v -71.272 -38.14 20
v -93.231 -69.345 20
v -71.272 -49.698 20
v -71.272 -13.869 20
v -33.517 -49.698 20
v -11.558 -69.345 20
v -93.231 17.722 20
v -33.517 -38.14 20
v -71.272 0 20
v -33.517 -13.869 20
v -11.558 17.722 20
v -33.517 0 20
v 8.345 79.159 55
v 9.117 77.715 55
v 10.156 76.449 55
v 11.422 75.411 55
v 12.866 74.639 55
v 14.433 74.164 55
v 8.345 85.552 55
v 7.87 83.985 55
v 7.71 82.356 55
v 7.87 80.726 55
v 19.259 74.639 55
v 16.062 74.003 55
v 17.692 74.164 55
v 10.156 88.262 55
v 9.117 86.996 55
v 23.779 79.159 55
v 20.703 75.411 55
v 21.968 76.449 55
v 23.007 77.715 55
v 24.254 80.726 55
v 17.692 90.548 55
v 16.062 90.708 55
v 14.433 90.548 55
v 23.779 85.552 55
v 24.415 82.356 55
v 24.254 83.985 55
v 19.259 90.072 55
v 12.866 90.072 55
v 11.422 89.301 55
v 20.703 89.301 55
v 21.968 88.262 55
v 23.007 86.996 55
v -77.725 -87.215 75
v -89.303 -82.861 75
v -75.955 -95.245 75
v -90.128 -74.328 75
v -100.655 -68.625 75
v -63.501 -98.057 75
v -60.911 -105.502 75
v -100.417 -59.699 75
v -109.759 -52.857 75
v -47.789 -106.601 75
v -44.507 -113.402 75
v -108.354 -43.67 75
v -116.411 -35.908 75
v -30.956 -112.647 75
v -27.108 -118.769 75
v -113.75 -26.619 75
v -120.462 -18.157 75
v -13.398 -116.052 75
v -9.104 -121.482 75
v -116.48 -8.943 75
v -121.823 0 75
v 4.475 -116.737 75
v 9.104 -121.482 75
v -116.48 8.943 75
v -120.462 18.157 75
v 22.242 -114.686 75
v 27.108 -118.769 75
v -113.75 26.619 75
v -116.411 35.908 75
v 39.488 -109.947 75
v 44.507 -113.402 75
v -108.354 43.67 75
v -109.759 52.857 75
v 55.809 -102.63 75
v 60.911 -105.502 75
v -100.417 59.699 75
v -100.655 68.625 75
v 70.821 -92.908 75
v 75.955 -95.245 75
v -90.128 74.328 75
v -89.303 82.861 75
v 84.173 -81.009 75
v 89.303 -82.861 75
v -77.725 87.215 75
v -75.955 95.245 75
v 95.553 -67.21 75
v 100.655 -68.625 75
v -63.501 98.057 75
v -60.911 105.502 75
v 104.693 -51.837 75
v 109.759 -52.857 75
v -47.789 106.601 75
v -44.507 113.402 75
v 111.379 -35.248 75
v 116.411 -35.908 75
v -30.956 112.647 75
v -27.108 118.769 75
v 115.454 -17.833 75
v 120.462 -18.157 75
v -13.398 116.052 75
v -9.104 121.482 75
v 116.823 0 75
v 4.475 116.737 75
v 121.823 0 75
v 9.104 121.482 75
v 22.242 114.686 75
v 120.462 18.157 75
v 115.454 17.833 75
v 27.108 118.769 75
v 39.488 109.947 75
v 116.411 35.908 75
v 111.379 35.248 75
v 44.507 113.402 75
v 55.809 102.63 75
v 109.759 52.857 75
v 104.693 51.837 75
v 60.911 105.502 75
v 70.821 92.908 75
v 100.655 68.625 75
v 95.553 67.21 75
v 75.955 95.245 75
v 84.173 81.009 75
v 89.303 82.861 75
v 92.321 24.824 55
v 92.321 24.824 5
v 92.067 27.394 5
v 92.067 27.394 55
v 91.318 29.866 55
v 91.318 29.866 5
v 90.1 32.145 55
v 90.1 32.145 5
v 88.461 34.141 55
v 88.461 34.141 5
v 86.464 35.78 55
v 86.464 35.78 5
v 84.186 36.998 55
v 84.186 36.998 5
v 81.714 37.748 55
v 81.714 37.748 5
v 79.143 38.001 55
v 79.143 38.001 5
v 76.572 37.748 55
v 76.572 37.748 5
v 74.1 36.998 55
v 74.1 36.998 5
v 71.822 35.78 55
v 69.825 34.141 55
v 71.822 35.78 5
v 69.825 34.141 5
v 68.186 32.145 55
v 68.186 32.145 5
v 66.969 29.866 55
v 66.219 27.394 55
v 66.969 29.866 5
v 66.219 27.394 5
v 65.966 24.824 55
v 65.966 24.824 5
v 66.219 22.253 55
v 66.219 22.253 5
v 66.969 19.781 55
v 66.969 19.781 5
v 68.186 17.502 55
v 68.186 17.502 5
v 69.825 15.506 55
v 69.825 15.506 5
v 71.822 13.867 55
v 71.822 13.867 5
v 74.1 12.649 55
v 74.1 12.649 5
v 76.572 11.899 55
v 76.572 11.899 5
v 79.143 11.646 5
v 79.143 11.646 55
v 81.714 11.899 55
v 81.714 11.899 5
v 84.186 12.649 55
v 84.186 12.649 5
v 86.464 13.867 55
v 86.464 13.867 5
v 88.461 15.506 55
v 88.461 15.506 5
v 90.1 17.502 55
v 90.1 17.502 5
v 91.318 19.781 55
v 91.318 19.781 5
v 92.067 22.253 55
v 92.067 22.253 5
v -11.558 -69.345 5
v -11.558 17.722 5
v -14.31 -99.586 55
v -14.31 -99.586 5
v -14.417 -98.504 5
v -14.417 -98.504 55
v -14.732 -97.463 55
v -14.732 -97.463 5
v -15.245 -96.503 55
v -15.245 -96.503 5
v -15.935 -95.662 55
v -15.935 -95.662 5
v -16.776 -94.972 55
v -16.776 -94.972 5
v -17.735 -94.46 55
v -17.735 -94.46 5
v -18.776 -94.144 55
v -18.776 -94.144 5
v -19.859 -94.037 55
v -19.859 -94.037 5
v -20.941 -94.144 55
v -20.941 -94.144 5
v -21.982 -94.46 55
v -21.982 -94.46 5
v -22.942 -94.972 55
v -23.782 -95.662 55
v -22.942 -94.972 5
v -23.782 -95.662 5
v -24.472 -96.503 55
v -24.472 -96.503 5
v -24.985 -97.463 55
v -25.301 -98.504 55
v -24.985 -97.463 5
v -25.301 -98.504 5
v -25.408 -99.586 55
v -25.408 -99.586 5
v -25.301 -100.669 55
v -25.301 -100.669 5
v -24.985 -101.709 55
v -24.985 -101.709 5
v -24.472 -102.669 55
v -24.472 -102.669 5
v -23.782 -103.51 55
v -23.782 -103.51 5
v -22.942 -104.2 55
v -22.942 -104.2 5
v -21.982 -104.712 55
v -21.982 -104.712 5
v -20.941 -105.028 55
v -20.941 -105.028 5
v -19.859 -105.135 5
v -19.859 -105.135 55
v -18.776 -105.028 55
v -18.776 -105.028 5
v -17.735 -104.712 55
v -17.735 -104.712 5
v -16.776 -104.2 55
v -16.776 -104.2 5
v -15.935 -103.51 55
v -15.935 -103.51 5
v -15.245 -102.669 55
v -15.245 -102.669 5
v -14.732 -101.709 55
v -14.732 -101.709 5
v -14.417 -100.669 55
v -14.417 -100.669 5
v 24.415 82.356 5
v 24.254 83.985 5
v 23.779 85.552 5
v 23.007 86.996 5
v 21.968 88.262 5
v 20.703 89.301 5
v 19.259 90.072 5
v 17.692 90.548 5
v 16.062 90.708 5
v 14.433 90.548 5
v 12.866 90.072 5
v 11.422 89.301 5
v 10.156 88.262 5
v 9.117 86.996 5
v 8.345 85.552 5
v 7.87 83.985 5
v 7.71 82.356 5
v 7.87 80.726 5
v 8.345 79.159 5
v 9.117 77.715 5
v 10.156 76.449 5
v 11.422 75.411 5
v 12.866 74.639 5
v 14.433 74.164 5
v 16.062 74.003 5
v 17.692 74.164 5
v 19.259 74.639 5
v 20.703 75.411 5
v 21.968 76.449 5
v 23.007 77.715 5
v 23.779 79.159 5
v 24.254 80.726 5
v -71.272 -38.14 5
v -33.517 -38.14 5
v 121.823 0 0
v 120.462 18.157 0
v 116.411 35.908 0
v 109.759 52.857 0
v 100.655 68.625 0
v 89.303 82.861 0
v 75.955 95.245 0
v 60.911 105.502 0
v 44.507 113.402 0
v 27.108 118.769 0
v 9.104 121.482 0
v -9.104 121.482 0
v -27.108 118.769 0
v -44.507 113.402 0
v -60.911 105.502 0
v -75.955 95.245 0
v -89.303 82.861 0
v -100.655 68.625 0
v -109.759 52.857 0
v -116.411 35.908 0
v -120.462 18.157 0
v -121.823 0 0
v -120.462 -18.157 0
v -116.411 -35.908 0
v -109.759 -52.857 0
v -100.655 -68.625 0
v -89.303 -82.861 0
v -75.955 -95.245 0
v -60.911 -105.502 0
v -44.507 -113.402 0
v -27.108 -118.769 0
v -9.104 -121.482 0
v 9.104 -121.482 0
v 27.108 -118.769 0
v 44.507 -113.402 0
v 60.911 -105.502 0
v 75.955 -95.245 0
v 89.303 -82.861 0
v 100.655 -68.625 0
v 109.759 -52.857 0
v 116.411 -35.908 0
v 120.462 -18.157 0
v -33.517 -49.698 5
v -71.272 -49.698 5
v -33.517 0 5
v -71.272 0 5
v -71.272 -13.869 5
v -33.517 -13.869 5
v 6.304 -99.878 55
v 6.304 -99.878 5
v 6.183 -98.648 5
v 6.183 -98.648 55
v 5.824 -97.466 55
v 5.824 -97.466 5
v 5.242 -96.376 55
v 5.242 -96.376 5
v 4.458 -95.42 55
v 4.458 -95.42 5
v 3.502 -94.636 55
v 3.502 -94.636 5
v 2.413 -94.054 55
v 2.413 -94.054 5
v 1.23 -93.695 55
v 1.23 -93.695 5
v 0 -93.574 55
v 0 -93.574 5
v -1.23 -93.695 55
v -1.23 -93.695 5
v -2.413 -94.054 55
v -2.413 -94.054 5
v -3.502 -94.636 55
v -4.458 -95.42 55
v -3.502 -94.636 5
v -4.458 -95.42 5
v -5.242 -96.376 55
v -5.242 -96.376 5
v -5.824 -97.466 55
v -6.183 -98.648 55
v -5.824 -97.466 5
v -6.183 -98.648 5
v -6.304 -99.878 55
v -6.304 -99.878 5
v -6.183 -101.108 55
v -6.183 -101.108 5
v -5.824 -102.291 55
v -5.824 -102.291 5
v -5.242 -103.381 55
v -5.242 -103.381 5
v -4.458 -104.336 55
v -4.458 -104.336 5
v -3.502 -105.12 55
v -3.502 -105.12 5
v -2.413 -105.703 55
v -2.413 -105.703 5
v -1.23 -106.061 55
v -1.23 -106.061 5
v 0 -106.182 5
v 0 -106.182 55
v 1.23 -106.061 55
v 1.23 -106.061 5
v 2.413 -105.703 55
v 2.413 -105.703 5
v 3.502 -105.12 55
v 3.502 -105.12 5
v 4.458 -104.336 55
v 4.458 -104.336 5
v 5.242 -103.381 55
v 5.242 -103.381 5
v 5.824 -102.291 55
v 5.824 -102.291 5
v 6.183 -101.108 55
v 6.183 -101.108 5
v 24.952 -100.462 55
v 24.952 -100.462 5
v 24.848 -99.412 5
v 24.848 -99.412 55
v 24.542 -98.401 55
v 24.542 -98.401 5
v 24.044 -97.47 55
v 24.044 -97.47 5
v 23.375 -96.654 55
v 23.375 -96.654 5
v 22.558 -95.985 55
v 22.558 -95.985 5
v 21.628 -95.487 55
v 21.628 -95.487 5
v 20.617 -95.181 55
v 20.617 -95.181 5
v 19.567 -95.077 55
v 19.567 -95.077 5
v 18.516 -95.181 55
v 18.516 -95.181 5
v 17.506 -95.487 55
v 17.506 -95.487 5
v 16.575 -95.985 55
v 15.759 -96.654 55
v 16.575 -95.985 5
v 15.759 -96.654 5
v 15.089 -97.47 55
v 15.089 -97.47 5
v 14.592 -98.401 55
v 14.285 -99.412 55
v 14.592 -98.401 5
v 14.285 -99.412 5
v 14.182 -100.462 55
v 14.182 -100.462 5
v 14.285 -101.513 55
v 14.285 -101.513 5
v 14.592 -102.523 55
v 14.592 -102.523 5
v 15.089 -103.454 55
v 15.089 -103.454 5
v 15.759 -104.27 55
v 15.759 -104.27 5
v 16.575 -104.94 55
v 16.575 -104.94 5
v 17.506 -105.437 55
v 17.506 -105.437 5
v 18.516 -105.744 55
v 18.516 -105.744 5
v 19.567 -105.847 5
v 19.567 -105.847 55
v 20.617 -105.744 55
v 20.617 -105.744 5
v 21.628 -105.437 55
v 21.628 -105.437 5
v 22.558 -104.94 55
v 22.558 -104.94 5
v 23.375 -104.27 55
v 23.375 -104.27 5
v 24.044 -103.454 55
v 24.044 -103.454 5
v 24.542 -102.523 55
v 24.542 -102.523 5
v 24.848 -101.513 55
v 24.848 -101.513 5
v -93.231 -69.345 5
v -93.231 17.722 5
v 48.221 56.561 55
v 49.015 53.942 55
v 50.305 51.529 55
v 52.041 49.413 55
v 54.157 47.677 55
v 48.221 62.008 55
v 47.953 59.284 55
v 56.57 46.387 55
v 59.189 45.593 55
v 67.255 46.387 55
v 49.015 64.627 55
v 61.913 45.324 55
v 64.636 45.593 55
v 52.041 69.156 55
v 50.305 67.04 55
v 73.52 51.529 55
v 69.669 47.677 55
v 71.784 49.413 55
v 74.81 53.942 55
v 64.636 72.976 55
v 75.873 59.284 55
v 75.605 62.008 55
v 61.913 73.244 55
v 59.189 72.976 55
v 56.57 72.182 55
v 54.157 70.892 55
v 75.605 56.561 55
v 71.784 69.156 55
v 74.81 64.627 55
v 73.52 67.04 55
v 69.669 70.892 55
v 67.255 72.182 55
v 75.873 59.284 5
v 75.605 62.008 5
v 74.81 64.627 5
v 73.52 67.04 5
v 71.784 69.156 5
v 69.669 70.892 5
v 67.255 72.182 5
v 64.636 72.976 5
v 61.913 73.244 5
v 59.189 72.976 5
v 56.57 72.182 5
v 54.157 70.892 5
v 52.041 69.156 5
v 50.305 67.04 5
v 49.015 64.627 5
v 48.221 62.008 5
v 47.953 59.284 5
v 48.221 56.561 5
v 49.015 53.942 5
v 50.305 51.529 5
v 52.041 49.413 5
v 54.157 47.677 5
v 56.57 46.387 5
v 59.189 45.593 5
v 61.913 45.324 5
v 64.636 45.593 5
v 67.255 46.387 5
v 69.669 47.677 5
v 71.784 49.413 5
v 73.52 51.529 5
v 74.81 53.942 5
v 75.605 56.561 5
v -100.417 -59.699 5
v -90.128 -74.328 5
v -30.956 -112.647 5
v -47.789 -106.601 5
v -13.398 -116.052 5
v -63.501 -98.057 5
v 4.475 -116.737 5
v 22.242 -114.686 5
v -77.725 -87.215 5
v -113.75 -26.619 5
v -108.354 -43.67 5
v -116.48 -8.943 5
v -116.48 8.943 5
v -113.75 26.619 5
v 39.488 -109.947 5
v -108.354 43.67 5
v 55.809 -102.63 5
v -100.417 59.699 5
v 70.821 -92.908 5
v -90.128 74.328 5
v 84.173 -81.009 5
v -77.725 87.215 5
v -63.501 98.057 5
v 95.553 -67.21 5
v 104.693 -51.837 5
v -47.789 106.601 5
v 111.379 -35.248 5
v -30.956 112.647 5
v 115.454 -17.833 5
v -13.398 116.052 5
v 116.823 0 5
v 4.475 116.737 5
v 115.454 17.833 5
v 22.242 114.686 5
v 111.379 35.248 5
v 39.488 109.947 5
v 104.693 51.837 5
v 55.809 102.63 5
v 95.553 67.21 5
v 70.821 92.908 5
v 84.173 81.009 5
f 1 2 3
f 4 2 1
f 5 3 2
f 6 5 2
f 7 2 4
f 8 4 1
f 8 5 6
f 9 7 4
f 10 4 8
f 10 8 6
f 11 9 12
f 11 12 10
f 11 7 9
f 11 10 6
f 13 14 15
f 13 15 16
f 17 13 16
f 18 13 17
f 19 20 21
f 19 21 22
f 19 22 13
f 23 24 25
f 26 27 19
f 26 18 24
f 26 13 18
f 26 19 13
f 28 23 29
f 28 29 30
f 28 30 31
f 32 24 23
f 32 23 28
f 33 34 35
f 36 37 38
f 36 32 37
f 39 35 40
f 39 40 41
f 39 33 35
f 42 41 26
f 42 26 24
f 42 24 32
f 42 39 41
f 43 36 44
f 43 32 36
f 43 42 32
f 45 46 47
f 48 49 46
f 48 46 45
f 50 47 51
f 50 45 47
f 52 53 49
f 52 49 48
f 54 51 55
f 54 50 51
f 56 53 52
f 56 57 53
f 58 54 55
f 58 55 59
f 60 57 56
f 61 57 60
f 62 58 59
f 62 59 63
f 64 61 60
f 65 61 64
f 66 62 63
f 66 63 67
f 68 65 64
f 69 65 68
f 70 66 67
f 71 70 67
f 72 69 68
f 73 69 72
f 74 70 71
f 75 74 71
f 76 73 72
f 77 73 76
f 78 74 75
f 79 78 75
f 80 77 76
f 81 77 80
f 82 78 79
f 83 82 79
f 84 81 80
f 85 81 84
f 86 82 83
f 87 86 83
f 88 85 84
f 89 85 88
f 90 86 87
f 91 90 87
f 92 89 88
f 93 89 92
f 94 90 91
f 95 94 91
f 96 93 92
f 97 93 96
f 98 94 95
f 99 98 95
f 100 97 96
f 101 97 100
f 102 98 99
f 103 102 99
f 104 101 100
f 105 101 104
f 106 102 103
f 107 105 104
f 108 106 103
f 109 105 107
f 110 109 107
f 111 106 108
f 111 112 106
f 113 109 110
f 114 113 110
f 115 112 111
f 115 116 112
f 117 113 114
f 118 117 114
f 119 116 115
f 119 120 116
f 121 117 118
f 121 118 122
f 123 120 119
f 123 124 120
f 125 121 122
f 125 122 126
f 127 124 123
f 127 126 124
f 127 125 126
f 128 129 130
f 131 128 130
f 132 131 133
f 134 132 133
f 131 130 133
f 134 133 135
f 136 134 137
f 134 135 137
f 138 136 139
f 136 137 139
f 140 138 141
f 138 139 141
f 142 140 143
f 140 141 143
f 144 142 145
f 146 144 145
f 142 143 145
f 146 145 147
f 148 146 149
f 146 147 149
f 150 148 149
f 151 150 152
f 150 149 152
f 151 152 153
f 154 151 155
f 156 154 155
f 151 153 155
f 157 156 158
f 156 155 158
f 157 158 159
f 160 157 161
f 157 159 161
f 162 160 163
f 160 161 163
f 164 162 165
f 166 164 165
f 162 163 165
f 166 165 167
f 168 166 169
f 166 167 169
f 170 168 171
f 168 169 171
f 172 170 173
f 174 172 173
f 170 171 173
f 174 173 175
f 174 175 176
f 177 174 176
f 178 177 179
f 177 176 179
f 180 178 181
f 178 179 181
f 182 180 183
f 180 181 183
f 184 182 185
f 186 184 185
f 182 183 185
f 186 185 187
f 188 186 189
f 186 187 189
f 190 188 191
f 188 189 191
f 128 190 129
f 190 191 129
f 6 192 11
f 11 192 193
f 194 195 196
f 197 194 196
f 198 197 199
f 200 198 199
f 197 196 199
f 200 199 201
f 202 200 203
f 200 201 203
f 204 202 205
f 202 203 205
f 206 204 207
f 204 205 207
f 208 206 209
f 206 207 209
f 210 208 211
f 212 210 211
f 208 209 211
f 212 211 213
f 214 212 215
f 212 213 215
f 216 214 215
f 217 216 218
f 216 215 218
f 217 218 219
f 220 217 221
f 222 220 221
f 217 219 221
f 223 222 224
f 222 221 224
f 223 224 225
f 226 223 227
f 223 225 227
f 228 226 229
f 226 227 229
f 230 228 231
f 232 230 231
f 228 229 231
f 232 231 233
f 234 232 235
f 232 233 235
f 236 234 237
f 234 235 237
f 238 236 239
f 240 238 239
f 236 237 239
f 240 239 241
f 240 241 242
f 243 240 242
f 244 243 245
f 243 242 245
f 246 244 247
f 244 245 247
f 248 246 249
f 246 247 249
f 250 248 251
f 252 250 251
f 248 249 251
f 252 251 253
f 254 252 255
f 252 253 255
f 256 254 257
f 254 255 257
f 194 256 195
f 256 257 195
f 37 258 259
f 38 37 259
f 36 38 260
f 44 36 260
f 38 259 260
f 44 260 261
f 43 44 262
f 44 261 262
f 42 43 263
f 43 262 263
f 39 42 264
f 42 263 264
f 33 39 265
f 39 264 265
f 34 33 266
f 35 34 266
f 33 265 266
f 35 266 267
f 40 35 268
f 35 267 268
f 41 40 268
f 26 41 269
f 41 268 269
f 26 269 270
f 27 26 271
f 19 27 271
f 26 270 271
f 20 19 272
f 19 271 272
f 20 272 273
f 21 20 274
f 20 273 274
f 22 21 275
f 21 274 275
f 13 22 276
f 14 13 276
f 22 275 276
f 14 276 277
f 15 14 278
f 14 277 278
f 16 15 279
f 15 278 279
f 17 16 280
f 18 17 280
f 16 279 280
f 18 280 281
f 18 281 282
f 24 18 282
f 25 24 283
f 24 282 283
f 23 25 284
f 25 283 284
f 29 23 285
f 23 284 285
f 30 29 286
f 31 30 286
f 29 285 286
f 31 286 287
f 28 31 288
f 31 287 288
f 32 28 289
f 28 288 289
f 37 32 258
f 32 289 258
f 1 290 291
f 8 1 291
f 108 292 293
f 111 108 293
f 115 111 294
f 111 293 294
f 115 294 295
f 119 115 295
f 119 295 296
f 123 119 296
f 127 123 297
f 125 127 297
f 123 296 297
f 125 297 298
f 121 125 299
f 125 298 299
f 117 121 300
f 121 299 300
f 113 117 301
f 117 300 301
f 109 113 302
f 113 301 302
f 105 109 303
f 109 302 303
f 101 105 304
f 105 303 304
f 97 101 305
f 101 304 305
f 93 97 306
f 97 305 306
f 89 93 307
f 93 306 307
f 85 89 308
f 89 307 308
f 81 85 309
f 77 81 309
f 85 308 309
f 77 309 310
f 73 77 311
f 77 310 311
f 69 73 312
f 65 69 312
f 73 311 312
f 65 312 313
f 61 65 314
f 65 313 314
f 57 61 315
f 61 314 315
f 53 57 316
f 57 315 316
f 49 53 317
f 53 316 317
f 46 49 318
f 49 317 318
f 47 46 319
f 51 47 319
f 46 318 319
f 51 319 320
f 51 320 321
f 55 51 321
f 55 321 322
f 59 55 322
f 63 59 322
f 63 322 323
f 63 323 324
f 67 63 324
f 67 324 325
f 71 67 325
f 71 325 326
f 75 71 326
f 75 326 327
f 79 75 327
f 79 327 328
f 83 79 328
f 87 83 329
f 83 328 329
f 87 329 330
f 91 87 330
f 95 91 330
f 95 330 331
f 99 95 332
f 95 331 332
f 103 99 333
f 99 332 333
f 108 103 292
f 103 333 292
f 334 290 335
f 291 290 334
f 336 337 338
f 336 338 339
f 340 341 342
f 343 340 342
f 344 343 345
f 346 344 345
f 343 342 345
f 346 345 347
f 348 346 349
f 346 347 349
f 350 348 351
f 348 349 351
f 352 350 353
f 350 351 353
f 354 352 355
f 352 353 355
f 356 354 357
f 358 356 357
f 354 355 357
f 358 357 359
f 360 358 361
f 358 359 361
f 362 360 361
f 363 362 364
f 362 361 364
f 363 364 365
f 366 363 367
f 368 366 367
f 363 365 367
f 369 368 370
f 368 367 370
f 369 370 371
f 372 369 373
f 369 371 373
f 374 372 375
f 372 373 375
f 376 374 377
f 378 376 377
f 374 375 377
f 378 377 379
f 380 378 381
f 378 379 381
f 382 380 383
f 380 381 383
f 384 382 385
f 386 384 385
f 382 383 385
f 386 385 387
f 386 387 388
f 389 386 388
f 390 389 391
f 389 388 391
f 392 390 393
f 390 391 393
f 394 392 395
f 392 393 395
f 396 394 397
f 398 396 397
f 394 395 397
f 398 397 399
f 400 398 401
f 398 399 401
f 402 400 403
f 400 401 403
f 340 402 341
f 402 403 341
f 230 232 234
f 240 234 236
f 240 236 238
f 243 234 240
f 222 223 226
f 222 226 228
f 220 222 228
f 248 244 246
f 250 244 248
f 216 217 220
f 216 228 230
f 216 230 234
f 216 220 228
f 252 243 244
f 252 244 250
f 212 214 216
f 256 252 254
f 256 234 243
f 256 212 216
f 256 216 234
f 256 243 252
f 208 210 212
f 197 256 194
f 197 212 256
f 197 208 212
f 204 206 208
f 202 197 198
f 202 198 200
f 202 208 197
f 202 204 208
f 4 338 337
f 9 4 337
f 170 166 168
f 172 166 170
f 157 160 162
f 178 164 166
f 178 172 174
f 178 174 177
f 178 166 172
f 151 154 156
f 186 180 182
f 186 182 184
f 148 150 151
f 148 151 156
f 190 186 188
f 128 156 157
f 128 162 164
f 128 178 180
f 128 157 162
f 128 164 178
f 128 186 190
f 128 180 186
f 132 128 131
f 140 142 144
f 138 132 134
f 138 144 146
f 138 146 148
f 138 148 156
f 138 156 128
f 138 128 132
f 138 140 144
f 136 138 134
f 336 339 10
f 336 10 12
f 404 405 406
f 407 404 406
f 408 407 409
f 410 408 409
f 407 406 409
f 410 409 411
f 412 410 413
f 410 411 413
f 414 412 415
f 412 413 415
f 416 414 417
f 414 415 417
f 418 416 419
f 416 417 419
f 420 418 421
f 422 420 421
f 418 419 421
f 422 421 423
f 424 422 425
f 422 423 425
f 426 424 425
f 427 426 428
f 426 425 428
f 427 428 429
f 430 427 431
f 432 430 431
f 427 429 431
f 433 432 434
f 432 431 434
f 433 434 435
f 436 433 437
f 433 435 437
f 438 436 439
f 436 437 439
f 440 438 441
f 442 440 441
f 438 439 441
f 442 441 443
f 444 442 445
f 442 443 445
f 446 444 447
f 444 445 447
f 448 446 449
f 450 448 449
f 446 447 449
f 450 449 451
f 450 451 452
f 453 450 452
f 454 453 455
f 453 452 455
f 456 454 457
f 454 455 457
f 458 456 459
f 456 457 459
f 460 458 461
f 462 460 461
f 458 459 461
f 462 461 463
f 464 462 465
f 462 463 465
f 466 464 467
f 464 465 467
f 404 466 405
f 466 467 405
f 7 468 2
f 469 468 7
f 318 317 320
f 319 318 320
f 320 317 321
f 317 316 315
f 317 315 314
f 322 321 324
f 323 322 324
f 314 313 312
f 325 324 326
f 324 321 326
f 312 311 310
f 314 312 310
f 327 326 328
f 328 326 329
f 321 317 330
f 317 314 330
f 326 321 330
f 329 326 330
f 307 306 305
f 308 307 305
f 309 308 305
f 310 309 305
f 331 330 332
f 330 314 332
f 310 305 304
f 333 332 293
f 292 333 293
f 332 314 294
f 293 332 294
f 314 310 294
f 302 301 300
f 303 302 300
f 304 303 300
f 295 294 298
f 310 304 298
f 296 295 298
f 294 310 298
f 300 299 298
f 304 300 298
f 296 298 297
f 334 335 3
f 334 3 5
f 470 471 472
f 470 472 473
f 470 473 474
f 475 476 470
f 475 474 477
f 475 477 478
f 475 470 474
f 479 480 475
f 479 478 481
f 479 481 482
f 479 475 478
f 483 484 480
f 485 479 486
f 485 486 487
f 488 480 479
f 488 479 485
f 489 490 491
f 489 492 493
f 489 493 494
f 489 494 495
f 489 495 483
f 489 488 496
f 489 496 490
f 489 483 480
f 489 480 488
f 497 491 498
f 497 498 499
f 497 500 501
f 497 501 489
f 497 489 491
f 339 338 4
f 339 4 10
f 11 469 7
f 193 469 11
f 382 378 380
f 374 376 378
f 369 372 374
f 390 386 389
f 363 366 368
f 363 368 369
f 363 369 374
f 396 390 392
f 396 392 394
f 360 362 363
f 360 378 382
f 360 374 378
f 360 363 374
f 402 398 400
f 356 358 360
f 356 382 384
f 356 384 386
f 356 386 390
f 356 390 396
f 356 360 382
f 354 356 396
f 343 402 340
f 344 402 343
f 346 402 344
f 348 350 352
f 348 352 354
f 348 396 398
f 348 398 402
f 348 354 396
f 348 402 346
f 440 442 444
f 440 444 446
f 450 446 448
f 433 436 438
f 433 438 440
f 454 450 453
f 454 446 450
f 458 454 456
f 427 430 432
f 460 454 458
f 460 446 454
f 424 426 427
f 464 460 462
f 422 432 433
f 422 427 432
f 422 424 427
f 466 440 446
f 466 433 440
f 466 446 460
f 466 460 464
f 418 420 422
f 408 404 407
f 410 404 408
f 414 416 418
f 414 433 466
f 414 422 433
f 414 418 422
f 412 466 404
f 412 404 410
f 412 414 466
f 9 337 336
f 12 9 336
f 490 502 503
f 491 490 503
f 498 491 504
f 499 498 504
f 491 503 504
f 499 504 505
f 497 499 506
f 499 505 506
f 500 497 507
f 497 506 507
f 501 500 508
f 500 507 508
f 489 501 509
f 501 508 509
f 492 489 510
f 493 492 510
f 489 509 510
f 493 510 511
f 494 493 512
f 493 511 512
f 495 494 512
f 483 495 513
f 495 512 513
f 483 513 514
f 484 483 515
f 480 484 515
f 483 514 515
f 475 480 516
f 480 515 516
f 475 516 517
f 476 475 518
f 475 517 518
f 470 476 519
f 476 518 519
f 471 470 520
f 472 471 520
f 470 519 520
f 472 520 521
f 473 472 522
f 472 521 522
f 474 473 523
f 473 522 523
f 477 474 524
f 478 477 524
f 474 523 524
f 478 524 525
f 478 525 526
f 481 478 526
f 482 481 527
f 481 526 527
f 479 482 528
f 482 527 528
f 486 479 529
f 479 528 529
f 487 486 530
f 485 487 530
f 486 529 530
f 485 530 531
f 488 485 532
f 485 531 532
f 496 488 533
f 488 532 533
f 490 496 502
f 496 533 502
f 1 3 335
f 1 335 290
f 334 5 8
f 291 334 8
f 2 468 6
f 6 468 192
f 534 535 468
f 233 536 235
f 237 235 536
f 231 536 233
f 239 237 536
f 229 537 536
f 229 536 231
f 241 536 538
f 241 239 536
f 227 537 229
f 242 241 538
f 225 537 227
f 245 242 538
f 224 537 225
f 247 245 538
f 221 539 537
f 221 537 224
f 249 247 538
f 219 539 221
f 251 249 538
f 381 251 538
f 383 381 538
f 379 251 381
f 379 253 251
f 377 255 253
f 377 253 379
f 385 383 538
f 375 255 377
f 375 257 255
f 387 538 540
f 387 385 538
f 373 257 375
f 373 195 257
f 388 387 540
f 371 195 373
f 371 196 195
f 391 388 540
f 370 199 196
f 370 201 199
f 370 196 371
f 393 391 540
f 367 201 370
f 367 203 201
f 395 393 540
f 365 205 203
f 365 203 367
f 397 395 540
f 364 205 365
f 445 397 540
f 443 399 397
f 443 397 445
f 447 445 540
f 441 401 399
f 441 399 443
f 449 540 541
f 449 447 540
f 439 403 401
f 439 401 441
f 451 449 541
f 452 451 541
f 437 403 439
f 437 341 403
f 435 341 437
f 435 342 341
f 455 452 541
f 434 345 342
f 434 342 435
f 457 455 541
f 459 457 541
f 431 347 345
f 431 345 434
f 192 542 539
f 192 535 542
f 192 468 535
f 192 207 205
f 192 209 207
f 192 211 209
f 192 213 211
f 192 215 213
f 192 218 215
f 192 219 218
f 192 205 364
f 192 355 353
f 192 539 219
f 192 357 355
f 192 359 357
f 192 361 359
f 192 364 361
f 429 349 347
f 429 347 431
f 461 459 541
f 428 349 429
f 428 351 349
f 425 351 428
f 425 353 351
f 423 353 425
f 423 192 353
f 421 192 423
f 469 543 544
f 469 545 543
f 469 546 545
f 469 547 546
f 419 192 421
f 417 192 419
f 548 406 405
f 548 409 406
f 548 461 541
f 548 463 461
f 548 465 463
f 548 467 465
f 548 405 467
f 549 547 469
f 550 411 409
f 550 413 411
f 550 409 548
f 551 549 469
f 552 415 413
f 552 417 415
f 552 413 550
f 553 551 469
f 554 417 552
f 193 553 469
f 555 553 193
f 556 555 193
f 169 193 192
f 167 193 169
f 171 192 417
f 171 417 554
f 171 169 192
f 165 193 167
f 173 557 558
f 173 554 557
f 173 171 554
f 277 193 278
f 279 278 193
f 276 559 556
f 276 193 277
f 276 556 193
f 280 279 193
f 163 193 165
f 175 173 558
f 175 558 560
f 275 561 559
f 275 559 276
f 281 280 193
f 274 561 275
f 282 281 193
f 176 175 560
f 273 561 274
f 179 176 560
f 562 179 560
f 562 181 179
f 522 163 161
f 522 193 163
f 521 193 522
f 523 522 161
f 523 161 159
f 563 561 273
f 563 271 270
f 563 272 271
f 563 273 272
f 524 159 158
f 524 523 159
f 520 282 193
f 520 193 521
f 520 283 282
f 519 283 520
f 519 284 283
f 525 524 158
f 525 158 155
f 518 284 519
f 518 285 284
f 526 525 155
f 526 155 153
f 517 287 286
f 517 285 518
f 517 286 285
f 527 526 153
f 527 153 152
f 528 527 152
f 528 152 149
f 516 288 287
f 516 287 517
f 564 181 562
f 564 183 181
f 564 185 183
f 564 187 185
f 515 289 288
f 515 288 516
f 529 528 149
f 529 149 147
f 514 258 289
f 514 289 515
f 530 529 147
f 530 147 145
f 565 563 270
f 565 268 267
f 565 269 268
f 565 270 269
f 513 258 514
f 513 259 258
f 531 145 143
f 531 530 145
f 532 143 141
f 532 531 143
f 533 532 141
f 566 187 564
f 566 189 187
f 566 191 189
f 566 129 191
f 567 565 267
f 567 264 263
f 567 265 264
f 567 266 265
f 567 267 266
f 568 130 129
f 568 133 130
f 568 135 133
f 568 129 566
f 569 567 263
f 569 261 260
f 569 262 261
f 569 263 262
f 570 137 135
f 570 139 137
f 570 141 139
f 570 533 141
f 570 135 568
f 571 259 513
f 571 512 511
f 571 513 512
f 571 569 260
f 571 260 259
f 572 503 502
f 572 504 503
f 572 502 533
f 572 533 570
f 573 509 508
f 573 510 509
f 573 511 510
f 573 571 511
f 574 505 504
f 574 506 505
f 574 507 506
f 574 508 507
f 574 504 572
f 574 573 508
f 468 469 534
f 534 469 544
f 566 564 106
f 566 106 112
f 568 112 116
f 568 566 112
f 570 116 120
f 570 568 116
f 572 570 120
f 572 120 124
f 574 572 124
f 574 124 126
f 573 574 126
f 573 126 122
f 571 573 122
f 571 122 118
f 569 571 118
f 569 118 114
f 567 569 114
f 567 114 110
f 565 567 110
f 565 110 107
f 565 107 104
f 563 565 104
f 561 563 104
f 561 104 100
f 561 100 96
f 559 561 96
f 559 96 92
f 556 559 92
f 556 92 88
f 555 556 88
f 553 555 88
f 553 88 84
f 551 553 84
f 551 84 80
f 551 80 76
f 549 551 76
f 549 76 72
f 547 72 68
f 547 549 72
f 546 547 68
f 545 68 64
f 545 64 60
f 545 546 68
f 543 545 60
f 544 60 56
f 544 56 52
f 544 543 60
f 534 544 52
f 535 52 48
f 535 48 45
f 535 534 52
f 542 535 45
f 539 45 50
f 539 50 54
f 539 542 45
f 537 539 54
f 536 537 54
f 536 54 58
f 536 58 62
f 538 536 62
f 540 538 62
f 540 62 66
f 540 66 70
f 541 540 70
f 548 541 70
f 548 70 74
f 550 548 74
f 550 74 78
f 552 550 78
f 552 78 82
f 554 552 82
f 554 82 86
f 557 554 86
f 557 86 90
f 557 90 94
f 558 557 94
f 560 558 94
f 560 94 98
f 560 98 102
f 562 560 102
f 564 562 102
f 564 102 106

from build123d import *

# Parameters (mm, degrees)
F0_R     = 121.822916
F1_DEPTH = 75
F2_T     = -5
F3_R     = 8.352587
F3_R_2   = 13.960052
F3_R_3   = 13.177503
F3_R_4   = 5.384974
F3_R_5   = 6.304301
F3_R_6   = 5.548783
F4_DEPTH = 50
F5_W     = 81.67348
F5_H     = 87.06702
F5_W_2   = 37.754722
F5_H_2   = 11.557571
F5_H_3   = 13.869084
F6_DEPTH = 15


with BuildPart() as f1:
    # F0 (on Top) → F1 (new body)
    with BuildSketch(Plane.XY):
        Circle(F0_R)
    extrude(amount=F1_DEPTH)

    # F2
    f2_openings = [f1.faces().sort_by_distance(p)[0] for p in [
        (0, 0, 75),
    ]]
    offset(amount=F2_T, openings=f2_openings)

    # F3 (on face) → F4 (join)
    with BuildSketch(Plane.XY.offset(5)):
        with Locations((16.062267, 82.355626)):
            Circle(F3_R)
        with Locations((61.912745, 59.28437)):
            Circle(F3_R_2)
        with Locations((79.143174, 24.823505)):
            Circle(F3_R_3)
        with Locations((19.566761, -100.462183)):
            Circle(F3_R_4)
        with Locations((0, -99.878103)):
            Circle(F3_R_5)
        with Locations((-19.858804, -99.586062)):
            Circle(F3_R_6)
    extrude(amount=F4_DEPTH)

    # F5 (on face) → F6 (join)
    with BuildSketch(Plane.XY.offset(5)):
        with Locations((-52.394312, -25.811905)):
            Rectangle(F5_W, F5_H)
        with Locations((-52.394312, -43.918762)):
            Rectangle(F5_W_2, F5_H_2, mode=Mode.SUBTRACT)
        with Locations((-52.394312, -6.934542)):
            Rectangle(F5_W_2, F5_H_3, mode=Mode.SUBTRACT)
    extrude(amount=F6_DEPTH)


solid = f1.part
